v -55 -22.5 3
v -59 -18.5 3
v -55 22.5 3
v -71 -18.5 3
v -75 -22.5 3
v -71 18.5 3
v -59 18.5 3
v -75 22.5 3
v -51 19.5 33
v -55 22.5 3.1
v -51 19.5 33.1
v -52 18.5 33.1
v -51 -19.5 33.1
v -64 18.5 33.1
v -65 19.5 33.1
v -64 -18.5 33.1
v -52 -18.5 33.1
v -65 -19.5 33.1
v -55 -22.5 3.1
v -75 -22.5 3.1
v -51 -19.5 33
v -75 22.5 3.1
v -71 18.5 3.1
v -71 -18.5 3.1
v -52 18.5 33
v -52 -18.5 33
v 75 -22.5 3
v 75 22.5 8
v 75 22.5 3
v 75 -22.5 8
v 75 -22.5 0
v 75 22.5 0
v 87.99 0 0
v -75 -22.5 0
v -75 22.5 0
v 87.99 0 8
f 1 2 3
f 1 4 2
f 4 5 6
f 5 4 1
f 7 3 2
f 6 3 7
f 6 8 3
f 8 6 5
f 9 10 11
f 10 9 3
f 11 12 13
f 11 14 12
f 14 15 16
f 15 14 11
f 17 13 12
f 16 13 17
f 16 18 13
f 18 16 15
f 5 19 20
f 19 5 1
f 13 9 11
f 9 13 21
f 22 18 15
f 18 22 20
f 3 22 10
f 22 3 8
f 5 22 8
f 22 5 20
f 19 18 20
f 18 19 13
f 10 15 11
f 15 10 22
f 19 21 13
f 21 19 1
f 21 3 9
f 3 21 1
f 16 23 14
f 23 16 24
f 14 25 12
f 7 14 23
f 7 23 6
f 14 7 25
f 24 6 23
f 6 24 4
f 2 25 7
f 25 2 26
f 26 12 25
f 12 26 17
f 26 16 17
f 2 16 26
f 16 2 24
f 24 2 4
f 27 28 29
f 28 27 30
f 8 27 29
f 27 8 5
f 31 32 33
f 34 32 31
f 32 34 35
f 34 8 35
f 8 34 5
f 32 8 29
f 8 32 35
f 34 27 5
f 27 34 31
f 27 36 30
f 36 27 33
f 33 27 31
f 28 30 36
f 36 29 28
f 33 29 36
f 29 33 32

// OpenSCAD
//Stab 37*12
$fn = 90;

baseHeight = 3;
width = 45;
length = 150;

translate([0, 0, baseHeight/2])
	cube([length, width, baseHeight], center=true);

translate([-length/2+10, 0, baseHeight])
	connector();

translate([length/2, 0, 0])
	rotate([0, 0, -90])
		isoscelesTriangle(baseLength=width, angle=120, height=baseHeight+5);


module connector(){
	barWidth = 37;
	barDepth = 12;
	sliceHeight = 0.1;
	height = 30;
	shift = 7;

	translate([0, 0, sliceHeight/2]){
		difference(){
			hull(){
				cube([barDepth+8, width, sliceHeight], center=true);
				translate([shift, 0, height])
					cube([barDepth+2, barWidth+2, sliceHeight], center=true);
			}
			#hull(){
				cube([barDepth, barWidth, sliceHeight], center=true);
				translate([shift, 0, height])
					cube([barDepth, barWidth, sliceHeight], center=true);
			}
			
		}
	}
}


module isoscelesTriangle(baseLength=5, angle=120, height=1){
	h = baseLength/2 / tan(angle/2);
	linear_extrude(height)
		polygon(points=[[-baseLength/2, 0], [baseLength/2, 0], [0, h]]);
}
